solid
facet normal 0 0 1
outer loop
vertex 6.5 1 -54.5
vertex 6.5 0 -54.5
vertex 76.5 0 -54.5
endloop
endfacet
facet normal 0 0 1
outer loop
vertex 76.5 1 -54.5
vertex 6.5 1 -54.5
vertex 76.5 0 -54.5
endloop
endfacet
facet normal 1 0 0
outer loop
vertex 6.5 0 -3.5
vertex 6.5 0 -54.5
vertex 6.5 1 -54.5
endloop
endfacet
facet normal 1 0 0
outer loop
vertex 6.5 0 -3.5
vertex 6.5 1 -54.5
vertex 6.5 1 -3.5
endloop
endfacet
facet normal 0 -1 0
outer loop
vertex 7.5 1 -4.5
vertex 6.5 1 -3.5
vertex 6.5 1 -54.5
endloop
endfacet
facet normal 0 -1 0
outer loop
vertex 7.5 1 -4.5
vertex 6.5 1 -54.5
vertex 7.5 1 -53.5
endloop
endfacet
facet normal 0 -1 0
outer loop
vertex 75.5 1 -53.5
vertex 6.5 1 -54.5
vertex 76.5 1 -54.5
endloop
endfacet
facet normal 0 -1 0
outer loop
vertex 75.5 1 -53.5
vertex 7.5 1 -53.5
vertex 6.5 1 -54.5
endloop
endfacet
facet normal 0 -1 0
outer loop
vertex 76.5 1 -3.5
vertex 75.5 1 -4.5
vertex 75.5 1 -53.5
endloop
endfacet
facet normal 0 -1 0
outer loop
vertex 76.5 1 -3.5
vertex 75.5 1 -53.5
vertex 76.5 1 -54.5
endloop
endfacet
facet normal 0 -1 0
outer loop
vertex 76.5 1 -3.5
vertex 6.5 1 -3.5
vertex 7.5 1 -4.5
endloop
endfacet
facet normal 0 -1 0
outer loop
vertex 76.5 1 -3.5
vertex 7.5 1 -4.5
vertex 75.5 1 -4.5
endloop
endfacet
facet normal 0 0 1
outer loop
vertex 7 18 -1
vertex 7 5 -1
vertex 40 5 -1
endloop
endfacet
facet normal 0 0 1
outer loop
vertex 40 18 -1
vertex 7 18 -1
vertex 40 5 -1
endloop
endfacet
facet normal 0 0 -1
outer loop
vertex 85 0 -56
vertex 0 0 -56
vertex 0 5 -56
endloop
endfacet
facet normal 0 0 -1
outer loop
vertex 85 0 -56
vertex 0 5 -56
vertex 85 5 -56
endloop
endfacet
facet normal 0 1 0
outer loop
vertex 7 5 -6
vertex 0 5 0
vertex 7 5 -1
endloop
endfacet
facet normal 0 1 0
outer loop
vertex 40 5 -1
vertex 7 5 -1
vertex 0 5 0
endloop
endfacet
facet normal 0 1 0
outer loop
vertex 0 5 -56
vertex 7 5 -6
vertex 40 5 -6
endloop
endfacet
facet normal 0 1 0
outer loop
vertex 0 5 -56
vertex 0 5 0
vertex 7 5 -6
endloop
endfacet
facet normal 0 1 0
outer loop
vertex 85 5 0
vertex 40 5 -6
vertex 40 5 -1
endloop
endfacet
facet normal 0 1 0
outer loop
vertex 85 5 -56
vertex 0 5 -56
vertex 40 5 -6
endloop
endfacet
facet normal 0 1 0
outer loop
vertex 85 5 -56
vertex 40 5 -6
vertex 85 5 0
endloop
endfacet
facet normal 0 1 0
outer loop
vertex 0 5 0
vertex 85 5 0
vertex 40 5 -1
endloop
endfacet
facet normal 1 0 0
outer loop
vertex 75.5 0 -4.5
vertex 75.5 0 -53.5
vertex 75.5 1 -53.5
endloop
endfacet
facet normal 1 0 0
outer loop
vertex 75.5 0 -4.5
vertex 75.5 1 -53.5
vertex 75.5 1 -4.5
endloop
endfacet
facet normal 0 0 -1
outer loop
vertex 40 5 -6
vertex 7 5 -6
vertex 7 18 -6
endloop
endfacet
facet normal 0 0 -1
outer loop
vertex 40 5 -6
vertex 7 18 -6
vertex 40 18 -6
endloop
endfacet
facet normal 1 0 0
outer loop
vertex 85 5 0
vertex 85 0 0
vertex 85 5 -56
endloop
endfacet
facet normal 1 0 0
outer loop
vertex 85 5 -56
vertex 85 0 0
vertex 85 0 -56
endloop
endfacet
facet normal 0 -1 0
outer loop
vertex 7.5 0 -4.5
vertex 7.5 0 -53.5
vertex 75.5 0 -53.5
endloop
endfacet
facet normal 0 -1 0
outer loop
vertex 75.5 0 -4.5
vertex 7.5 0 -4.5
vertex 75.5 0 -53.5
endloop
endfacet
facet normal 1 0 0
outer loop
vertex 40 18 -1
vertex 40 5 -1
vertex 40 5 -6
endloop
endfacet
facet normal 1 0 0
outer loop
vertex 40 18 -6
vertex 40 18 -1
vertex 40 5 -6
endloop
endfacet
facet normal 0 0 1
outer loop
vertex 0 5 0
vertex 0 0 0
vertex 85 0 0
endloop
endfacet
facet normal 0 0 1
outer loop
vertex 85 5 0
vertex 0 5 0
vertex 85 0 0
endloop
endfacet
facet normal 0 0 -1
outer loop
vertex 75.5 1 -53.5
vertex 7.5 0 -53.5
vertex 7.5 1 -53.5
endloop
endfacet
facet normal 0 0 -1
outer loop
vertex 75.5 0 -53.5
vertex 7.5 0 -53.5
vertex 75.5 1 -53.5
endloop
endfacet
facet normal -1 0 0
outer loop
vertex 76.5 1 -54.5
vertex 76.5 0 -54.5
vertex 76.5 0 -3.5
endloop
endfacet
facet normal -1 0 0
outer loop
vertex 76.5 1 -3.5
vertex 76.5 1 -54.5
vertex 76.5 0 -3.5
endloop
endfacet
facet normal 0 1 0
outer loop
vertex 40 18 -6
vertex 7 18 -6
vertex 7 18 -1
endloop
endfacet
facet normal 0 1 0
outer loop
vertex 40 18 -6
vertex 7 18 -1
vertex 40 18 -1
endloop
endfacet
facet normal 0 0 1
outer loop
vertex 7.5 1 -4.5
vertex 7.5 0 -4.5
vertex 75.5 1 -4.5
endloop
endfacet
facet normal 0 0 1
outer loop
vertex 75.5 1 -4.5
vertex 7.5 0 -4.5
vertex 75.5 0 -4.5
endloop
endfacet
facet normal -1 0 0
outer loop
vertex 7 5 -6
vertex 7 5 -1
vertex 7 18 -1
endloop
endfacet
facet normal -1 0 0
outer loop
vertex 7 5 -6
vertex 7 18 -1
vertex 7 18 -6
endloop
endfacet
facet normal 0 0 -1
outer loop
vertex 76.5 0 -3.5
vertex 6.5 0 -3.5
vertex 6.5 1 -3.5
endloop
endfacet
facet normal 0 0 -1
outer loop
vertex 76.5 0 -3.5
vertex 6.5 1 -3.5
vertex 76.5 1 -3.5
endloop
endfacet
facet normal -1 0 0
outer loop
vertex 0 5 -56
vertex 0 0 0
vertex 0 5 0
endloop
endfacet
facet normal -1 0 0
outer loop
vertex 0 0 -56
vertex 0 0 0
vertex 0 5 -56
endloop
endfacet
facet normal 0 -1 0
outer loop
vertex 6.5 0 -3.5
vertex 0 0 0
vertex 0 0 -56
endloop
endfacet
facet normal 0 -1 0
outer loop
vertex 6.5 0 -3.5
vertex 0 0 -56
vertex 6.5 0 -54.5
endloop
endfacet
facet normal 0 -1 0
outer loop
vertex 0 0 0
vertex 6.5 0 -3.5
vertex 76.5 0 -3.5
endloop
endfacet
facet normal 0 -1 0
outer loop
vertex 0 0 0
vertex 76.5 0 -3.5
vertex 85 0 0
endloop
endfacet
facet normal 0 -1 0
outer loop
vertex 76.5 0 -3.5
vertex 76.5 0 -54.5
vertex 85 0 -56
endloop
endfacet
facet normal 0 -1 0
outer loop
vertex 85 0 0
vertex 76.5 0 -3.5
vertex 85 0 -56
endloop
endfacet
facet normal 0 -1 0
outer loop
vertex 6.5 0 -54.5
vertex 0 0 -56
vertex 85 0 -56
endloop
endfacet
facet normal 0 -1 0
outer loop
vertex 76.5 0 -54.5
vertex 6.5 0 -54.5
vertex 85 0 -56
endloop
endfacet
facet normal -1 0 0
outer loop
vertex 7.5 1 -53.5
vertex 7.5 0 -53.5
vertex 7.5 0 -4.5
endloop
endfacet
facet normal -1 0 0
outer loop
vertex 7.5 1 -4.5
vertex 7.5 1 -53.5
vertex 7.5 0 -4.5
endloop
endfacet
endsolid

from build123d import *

# Parameters (mm, degrees)
SKETCH_1_W          = 85
SKETCH_1_H          = 56
EXTRUDE_1_DEPTH     = 5
SKETCH_2_W          = 33
SKETCH_2_H          = 5
EXTRUDE_2_DEPTH     = 13
SKETCH_3_W          = 70
SKETCH_3_H          = 51
SKETCH_3_W_2        = 68
SKETCH_3_H_2        = 49
CUT_EXTRUDE_1_DEPTH = 1


with BuildPart() as part:
    # Эскиз1 → Бобышка-Вытянуть1 (new body)
    with BuildSketch(Plane(origin=(0, 0, 0), x_dir=(1, 0, 0), z_dir=(0, 1, 0))):
        with Locations((42.5, 28)):
            Rectangle(SKETCH_1_W, SKETCH_1_H)
    extrude(amount=EXTRUDE_1_DEPTH)

    # Эскиз2 → Бобышка-Вытянуть2 (add)
    with BuildSketch(Plane(origin=(0, 5, 0), x_dir=(1, 0, 0), z_dir=(0, 1, 0))):
        with Locations((23.5, 3.5)):
            Rectangle(SKETCH_2_W, SKETCH_2_H)
    extrude(amount=EXTRUDE_2_DEPTH)

    # Эскиз3 → Вырез-Вытянуть-Тонкостенный1 (cut)
    with BuildSketch(Plane.XZ):
        with Locations((41.5, -29)):
            Rectangle(SKETCH_3_W, SKETCH_3_H)
        with Locations((41.5, -29)):
            Rectangle(SKETCH_3_W_2, SKETCH_3_H_2, mode=Mode.SUBTRACT)
    extrude(amount=-CUT_EXTRUDE_1_DEPTH, mode=Mode.SUBTRACT)


solid = part.part
